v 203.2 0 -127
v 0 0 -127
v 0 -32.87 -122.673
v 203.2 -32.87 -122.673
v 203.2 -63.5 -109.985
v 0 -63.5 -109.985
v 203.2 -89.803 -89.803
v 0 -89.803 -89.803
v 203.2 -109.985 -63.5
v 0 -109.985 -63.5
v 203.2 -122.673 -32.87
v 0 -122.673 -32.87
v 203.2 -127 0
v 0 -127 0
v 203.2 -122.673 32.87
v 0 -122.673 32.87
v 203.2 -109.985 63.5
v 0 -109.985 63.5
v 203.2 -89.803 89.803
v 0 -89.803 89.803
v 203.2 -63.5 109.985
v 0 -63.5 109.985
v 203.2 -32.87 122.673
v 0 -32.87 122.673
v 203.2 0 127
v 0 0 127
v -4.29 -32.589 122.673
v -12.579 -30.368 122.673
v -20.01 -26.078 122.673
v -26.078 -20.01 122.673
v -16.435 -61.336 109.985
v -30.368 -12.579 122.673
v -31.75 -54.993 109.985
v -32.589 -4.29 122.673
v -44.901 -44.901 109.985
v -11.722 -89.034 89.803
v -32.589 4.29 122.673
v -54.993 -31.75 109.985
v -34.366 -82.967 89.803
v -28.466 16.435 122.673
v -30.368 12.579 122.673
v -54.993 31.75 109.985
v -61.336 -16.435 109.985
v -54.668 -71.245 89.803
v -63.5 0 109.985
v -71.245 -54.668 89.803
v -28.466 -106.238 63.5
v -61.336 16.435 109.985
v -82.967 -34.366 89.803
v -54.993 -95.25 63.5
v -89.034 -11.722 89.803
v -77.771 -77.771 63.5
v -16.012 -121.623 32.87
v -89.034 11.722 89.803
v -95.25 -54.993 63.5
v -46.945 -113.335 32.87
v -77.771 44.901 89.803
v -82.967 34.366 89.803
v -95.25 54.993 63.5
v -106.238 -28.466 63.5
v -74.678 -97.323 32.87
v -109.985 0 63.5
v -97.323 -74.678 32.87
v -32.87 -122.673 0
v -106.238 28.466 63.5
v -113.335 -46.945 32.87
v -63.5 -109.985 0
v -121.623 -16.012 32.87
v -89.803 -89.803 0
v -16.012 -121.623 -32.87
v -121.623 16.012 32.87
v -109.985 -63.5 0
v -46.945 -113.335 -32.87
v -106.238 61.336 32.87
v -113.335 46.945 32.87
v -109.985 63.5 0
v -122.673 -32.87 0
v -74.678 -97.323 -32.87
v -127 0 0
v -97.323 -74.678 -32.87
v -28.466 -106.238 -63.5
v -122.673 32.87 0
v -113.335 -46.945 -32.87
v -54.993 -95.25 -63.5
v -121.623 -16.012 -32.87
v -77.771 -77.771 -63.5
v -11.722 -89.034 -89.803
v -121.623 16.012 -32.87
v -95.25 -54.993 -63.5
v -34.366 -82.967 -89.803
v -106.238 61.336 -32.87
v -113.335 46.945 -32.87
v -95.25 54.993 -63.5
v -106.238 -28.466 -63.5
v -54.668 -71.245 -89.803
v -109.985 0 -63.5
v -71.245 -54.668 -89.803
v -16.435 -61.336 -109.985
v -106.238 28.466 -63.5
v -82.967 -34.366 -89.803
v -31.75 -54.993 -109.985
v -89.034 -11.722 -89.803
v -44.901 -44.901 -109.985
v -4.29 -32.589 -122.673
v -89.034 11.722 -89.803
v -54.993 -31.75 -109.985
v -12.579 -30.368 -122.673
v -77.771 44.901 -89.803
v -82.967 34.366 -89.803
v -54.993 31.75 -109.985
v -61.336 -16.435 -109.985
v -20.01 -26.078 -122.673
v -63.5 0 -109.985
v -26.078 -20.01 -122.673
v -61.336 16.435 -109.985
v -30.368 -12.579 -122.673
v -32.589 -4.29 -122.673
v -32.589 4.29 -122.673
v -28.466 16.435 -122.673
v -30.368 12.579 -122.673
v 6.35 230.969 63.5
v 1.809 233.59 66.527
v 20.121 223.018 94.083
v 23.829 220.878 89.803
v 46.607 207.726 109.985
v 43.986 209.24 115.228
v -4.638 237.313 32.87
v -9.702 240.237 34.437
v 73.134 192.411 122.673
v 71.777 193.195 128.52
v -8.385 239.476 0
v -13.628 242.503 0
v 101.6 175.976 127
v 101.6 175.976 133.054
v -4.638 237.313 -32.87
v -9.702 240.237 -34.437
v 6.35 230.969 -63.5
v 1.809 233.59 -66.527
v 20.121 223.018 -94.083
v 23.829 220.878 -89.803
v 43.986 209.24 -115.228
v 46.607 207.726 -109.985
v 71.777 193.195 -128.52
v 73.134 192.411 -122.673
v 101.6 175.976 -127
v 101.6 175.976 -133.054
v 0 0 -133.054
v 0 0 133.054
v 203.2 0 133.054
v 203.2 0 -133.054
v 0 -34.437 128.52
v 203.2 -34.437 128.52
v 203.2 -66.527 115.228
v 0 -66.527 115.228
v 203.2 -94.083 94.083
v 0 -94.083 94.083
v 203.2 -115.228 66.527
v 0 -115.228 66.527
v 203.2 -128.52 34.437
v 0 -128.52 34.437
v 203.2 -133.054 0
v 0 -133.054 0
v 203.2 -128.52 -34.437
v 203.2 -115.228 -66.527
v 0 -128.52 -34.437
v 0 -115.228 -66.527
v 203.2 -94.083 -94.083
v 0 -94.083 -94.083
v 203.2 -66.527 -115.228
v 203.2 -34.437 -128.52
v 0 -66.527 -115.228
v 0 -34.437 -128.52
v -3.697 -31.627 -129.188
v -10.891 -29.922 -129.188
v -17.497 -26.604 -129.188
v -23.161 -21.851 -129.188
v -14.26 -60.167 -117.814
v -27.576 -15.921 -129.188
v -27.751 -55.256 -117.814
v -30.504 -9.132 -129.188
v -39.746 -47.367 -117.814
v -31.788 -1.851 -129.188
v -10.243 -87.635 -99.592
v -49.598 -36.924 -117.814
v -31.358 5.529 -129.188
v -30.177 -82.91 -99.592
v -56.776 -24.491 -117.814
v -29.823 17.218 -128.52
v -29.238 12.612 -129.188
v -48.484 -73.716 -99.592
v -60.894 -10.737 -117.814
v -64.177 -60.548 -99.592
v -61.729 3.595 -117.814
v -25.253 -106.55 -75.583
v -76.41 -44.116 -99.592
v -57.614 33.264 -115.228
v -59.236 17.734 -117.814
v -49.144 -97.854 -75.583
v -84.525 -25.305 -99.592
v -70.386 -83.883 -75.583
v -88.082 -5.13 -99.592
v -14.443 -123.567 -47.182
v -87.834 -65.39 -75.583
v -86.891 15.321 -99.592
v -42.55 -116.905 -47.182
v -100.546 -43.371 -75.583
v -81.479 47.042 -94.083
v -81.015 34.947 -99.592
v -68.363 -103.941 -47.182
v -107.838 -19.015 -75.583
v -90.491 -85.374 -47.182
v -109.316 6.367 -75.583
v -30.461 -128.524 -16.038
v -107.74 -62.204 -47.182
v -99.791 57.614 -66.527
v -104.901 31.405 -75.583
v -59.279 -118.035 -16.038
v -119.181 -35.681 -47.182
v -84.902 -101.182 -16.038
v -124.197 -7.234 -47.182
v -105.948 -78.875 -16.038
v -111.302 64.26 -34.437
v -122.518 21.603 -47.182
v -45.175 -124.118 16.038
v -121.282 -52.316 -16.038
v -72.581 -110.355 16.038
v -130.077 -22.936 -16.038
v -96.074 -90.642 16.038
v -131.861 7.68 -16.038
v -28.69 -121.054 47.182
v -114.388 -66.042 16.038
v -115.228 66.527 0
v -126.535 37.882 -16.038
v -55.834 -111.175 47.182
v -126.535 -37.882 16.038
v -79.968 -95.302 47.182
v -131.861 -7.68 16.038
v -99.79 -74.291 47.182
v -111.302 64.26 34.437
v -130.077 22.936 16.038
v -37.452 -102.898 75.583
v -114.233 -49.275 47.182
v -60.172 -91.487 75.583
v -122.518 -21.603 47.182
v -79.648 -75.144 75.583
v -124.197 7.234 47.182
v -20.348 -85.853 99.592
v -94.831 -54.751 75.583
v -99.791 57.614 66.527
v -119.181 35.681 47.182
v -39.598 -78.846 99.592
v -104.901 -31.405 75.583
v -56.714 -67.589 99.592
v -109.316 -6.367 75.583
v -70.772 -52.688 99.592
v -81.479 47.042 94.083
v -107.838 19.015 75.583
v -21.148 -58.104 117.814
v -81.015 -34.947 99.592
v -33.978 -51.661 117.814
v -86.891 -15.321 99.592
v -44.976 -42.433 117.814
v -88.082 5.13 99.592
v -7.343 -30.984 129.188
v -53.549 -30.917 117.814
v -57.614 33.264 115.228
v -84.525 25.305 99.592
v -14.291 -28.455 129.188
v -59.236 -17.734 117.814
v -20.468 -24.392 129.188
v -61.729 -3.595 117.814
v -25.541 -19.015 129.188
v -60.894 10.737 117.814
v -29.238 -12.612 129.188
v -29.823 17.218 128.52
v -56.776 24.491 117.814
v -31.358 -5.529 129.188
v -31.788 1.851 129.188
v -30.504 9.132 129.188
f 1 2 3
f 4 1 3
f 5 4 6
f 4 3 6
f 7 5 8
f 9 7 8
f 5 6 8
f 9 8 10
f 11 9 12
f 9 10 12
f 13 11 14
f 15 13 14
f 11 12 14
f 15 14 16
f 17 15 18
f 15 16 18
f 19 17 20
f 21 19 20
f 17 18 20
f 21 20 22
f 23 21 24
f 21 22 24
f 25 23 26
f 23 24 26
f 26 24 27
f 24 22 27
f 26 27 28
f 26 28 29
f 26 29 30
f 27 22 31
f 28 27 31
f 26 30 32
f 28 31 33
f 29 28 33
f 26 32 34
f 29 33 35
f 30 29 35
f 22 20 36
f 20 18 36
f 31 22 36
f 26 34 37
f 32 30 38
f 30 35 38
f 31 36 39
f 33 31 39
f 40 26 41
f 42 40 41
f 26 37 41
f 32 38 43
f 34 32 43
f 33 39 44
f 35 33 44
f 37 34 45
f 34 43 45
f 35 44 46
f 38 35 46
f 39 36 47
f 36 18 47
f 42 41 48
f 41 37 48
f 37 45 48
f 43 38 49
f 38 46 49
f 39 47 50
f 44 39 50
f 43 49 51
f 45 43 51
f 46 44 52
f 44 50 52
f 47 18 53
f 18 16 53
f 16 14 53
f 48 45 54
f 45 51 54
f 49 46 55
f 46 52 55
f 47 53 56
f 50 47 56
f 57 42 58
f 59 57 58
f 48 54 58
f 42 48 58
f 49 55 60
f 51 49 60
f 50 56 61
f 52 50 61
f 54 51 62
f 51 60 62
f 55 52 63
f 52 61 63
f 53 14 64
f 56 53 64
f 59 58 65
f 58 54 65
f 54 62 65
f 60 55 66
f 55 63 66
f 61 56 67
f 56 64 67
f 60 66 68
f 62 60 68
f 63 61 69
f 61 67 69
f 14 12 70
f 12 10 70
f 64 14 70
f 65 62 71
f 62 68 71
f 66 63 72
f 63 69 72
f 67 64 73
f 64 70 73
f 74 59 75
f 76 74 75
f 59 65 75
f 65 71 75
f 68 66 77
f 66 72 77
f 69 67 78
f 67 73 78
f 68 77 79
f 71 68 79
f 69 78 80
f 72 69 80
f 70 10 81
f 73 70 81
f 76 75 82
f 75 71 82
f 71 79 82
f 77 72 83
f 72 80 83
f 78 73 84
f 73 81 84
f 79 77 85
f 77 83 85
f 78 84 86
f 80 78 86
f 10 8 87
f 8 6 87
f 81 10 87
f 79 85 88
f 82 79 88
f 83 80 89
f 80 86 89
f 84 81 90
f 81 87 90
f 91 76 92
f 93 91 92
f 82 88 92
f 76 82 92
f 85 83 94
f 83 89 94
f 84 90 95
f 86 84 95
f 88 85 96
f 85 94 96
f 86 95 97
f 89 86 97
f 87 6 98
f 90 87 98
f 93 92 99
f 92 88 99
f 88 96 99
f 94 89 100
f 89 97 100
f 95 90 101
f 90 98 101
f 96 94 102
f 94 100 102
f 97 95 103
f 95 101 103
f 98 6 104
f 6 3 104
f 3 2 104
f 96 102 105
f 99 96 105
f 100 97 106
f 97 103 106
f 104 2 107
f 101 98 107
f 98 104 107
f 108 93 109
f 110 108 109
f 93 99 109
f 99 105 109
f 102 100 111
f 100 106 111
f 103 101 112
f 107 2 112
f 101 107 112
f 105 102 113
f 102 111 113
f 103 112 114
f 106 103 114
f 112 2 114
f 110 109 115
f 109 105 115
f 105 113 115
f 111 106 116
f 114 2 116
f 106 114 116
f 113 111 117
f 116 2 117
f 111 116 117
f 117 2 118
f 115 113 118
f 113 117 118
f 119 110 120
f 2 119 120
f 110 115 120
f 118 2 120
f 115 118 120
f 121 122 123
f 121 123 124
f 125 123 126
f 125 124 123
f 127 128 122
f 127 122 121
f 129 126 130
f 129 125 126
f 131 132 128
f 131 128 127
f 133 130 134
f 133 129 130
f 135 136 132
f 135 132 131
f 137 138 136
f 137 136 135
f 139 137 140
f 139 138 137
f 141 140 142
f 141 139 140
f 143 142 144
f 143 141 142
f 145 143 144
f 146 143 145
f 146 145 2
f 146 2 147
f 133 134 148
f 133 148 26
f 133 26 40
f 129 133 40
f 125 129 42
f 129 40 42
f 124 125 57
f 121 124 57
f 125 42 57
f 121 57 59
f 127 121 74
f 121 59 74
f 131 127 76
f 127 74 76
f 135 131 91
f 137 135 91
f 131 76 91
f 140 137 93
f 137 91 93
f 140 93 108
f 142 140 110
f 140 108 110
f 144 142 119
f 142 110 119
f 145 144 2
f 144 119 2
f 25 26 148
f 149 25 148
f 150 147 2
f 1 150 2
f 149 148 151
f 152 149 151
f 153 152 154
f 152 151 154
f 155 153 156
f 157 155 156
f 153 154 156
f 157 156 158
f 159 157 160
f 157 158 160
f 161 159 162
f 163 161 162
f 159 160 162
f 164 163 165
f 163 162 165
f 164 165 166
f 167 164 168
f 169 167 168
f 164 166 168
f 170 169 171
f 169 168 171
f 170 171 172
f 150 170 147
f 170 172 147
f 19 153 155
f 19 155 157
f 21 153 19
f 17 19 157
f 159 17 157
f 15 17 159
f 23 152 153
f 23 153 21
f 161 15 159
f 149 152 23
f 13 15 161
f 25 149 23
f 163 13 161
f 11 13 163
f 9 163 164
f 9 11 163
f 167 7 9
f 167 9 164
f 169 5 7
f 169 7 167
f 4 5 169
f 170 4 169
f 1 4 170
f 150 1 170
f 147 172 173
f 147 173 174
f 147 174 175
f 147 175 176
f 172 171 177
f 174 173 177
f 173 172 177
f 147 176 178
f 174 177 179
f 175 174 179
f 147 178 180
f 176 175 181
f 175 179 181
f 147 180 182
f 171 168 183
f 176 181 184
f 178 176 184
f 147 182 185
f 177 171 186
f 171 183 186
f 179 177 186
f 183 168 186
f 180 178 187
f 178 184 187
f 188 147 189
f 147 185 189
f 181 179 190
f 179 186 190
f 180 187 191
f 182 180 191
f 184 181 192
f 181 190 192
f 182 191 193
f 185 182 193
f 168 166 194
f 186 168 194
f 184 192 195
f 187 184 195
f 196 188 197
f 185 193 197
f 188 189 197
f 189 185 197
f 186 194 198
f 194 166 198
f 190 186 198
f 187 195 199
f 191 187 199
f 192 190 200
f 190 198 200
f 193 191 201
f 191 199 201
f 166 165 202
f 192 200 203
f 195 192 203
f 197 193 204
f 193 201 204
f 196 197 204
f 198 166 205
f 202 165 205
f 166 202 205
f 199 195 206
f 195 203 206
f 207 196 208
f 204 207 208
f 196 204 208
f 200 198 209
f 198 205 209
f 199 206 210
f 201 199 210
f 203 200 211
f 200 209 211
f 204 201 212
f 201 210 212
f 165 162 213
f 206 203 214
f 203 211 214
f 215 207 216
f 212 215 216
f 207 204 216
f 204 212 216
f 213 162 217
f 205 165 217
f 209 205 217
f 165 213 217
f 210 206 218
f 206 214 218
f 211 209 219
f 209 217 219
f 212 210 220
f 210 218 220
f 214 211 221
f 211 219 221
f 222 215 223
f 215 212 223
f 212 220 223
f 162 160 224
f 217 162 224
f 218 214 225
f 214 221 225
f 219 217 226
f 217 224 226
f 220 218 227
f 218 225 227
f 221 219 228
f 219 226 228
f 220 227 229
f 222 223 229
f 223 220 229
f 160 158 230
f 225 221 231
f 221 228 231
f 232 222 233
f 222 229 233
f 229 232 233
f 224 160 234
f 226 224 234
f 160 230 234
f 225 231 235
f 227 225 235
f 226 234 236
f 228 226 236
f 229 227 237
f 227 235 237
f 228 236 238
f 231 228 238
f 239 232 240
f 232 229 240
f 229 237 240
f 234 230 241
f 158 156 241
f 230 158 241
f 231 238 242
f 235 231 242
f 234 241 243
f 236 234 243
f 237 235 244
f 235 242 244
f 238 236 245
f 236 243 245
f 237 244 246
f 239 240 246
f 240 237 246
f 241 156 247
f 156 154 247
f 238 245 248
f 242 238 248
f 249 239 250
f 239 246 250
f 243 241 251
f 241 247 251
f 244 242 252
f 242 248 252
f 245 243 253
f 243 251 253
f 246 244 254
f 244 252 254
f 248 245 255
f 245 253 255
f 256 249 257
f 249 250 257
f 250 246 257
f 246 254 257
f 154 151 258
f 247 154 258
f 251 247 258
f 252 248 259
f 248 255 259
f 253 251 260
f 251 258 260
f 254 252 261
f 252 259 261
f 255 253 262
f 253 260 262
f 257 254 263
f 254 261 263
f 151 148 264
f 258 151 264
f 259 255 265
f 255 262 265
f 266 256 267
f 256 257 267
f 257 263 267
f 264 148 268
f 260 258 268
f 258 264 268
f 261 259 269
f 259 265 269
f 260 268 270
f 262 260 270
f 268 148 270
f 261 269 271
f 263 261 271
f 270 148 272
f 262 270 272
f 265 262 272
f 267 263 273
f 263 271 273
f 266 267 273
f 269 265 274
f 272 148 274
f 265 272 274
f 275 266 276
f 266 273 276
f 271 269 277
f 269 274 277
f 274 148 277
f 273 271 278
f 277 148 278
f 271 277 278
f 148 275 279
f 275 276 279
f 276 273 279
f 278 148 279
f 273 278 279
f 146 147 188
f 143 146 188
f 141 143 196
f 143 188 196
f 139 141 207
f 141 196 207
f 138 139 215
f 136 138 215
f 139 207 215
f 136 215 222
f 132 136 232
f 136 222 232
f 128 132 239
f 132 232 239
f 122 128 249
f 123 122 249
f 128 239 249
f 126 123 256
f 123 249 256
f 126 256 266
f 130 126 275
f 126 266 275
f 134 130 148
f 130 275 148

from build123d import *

# Parameters (mm, degrees)
REVOLVE4_ANGLE      = 120
BOSS_EXTRUDE3_DEPTH = 203.2
BOSS_EXTRUDE4_DEPTH = 203.2


with BuildPart() as part:
    # Sketch7 → Revolve4 (revolve)
    with BuildSketch(Plane(origin=(0, 0, 0), x_dir=(0, 0, -1), z_dir=(1, 0, 0))):
        with BuildLine():
            Line((-133.054110977, 0), (-127, 0))
            ThreePointArc((-127, 0), (0, -127), (127, 0))
            Line((127, 0), (133.054110977, 0))
            ThreePointArc((133.054110977, 0), (0, -133.054110977), (-133.054110977, 0))
        make_face()
    revolve(axis=Axis((0, 0, 127), (0, 0, -1)), revolution_arc=REVOLVE4_ANGLE)

    # Sketch8 → Boss-Extrude3 (add)
    with BuildSketch(Plane(origin=(0, 0, 0), x_dir=(0, 0, -1), z_dir=(1, 0, 0))):
        with BuildLine():
            Line((-127, 0), (-133.054110977, 0))
            ThreePointArc((-133.054110977, 0), (0, -133.054110977), (133.054110977, 0))
            Line((133.054110977, 0), (127, 0))
            ThreePointArc((127, 0), (0, -127), (-127, 0))
        make_face()
    extrude(amount=BOSS_EXTRUDE3_DEPTH)

    # Sketch9 → Boss-Extrude4 (add)
    with BuildSketch(Plane(origin=(0, 0, 0), x_dir=(0.8660254037844363, -0.5000000000000043, 0), z_dir=(0.5000000000000042, 0.8660254037844362, 0))):
        with BuildLine():
            Line((0, 127), (0, 133.054110977))
            ThreePointArc((0, 133.054110977), (-133.054110977, 0), (0, -133.054110977))
            Line((0, -133.054110977), (0, -127))
            ThreePointArc((0, -127), (-127, 0), (0, 127))
        make_face()
    extrude(amount=BOSS_EXTRUDE4_DEPTH)


solid = part.part
